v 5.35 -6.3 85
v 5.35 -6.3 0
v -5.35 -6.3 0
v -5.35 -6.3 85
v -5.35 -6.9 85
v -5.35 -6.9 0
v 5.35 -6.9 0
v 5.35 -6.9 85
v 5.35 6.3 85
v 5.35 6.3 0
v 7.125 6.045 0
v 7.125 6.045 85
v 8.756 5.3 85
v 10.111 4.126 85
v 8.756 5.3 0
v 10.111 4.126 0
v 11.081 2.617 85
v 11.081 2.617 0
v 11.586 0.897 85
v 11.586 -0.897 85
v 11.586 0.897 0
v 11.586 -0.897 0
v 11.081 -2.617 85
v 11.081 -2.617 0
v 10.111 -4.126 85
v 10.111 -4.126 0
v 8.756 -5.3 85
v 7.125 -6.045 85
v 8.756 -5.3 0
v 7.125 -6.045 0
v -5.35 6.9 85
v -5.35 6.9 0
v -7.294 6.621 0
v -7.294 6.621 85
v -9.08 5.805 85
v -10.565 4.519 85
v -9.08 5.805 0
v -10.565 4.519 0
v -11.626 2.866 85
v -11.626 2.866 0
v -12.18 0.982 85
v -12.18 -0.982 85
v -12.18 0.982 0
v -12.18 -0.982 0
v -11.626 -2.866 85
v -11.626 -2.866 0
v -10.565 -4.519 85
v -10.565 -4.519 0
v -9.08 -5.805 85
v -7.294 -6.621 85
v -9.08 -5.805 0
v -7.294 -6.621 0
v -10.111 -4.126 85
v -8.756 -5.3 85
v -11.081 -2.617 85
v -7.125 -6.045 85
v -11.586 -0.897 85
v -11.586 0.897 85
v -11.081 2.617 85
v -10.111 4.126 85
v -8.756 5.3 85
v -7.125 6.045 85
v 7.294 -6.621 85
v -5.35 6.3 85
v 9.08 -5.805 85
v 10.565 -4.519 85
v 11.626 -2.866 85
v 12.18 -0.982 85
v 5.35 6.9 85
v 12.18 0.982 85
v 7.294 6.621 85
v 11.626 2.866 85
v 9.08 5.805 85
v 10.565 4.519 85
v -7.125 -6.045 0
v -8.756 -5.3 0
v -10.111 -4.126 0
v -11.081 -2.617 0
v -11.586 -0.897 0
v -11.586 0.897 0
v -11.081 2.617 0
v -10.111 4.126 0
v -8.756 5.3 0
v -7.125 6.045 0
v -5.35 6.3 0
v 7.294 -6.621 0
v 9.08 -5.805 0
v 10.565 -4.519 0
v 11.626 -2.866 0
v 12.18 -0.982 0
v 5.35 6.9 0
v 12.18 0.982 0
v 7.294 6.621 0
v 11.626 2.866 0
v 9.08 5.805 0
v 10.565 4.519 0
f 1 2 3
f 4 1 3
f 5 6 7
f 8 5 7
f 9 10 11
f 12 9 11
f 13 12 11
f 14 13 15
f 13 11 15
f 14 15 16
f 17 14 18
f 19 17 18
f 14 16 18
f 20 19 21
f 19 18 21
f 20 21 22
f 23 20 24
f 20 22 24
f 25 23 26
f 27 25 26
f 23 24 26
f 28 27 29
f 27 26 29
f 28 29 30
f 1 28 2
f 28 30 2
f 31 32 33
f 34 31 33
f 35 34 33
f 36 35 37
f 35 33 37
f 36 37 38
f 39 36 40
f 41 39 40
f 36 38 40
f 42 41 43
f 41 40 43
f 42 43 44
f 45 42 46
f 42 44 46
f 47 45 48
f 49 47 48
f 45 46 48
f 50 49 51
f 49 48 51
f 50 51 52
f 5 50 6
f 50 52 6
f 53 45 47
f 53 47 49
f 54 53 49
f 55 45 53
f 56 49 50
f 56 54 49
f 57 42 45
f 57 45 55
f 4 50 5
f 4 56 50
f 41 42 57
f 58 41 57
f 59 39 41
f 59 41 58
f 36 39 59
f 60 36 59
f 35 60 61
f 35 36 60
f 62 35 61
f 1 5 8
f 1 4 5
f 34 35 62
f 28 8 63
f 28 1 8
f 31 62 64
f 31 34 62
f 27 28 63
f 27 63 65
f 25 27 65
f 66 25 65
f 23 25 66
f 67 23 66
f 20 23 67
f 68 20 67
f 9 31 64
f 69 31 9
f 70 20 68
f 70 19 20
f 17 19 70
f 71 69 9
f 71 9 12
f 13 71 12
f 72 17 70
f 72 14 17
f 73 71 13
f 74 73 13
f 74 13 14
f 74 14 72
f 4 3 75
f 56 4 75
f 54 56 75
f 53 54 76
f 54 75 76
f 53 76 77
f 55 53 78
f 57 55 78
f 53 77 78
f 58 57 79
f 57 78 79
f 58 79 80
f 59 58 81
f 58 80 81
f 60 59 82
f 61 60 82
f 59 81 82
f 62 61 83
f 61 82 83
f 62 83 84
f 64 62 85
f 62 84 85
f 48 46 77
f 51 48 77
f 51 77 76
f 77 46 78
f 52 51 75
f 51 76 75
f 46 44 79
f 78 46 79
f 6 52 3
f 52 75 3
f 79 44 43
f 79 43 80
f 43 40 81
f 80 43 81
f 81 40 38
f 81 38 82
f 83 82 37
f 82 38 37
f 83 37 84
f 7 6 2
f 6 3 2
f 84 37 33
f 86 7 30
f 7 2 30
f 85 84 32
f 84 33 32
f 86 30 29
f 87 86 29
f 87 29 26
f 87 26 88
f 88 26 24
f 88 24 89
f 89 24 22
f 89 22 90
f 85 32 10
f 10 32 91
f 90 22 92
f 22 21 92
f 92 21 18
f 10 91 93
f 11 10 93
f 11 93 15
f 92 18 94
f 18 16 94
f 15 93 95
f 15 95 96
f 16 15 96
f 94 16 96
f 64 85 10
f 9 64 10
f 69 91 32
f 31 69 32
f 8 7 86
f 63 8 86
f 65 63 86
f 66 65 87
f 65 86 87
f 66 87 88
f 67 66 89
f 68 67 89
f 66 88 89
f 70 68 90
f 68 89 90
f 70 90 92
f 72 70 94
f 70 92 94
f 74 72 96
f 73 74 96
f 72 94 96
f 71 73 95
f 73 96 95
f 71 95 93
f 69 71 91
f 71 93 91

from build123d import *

# Parameters (mm, degrees)
F1_DEPTH = 85
F0_W     = 50
F0_H     = 7
F2_R     = 12.5
F2_R_2   = 7.5
F3_DEPTH = 12.5
F4_W     = 25.6223708915
F4_H     = 20
F5_DEPTH = 25


with BuildPart() as f1:
    # F0 (on Top) → F1 (new body)
    with BuildSketch(Plane.XY):
        with BuildLine():
            Line((5.35, 6.9), (-5.35, 6.9))
            ThreePointArc((-5.35, 6.9), (-12.25, 0), (-5.35, -6.9))
            Line((-5.35, -6.9), (5.35, -6.9))
            ThreePointArc((5.35, -6.9), (12.25, 0), (5.35, 6.9))
        make_face()
        with BuildLine():
            ThreePointArc((-5.35, -6.3), (-11.65, 0), (-5.35, 6.3))
            Line((-5.35, 6.3), (5.35, 6.3))
            ThreePointArc((5.35, 6.3), (11.65, 0), (5.35, -6.3))
            Line((5.35, -6.3), (-5.35, -6.3))
        make_face(mode=Mode.SUBTRACT)
    extrude(amount=F1_DEPTH)


with BuildPart() as f1b:
    # F0 (on Top) → F1, piece 2 (new body)
    with BuildSketch(Plane.XY):
        with Locations((0, -23.5)):
            Rectangle(F0_W, F0_H)
    extrude(amount=F1_DEPTH)


with BuildPart() as f3:
    # F2 (on Right) → F3 (new body, symmetric)
    with BuildSketch(Plane.YZ):
        with Locations((-35, 30)):
            Circle(F2_R)
        with Locations((-35, 30)):
            Circle(F2_R_2, mode=Mode.SUBTRACT)
    extrude(amount=F3_DEPTH, both=True)

    # F4 (on face) → F5 (join)
    with BuildSketch(Plane.YZ.offset(12.5)):
        with Locations((-42.8111854458, 34.4098300563)):
            Rectangle(F4_W, F4_H)
    extrude(amount=F5_DEPTH)


solid = f1.part
